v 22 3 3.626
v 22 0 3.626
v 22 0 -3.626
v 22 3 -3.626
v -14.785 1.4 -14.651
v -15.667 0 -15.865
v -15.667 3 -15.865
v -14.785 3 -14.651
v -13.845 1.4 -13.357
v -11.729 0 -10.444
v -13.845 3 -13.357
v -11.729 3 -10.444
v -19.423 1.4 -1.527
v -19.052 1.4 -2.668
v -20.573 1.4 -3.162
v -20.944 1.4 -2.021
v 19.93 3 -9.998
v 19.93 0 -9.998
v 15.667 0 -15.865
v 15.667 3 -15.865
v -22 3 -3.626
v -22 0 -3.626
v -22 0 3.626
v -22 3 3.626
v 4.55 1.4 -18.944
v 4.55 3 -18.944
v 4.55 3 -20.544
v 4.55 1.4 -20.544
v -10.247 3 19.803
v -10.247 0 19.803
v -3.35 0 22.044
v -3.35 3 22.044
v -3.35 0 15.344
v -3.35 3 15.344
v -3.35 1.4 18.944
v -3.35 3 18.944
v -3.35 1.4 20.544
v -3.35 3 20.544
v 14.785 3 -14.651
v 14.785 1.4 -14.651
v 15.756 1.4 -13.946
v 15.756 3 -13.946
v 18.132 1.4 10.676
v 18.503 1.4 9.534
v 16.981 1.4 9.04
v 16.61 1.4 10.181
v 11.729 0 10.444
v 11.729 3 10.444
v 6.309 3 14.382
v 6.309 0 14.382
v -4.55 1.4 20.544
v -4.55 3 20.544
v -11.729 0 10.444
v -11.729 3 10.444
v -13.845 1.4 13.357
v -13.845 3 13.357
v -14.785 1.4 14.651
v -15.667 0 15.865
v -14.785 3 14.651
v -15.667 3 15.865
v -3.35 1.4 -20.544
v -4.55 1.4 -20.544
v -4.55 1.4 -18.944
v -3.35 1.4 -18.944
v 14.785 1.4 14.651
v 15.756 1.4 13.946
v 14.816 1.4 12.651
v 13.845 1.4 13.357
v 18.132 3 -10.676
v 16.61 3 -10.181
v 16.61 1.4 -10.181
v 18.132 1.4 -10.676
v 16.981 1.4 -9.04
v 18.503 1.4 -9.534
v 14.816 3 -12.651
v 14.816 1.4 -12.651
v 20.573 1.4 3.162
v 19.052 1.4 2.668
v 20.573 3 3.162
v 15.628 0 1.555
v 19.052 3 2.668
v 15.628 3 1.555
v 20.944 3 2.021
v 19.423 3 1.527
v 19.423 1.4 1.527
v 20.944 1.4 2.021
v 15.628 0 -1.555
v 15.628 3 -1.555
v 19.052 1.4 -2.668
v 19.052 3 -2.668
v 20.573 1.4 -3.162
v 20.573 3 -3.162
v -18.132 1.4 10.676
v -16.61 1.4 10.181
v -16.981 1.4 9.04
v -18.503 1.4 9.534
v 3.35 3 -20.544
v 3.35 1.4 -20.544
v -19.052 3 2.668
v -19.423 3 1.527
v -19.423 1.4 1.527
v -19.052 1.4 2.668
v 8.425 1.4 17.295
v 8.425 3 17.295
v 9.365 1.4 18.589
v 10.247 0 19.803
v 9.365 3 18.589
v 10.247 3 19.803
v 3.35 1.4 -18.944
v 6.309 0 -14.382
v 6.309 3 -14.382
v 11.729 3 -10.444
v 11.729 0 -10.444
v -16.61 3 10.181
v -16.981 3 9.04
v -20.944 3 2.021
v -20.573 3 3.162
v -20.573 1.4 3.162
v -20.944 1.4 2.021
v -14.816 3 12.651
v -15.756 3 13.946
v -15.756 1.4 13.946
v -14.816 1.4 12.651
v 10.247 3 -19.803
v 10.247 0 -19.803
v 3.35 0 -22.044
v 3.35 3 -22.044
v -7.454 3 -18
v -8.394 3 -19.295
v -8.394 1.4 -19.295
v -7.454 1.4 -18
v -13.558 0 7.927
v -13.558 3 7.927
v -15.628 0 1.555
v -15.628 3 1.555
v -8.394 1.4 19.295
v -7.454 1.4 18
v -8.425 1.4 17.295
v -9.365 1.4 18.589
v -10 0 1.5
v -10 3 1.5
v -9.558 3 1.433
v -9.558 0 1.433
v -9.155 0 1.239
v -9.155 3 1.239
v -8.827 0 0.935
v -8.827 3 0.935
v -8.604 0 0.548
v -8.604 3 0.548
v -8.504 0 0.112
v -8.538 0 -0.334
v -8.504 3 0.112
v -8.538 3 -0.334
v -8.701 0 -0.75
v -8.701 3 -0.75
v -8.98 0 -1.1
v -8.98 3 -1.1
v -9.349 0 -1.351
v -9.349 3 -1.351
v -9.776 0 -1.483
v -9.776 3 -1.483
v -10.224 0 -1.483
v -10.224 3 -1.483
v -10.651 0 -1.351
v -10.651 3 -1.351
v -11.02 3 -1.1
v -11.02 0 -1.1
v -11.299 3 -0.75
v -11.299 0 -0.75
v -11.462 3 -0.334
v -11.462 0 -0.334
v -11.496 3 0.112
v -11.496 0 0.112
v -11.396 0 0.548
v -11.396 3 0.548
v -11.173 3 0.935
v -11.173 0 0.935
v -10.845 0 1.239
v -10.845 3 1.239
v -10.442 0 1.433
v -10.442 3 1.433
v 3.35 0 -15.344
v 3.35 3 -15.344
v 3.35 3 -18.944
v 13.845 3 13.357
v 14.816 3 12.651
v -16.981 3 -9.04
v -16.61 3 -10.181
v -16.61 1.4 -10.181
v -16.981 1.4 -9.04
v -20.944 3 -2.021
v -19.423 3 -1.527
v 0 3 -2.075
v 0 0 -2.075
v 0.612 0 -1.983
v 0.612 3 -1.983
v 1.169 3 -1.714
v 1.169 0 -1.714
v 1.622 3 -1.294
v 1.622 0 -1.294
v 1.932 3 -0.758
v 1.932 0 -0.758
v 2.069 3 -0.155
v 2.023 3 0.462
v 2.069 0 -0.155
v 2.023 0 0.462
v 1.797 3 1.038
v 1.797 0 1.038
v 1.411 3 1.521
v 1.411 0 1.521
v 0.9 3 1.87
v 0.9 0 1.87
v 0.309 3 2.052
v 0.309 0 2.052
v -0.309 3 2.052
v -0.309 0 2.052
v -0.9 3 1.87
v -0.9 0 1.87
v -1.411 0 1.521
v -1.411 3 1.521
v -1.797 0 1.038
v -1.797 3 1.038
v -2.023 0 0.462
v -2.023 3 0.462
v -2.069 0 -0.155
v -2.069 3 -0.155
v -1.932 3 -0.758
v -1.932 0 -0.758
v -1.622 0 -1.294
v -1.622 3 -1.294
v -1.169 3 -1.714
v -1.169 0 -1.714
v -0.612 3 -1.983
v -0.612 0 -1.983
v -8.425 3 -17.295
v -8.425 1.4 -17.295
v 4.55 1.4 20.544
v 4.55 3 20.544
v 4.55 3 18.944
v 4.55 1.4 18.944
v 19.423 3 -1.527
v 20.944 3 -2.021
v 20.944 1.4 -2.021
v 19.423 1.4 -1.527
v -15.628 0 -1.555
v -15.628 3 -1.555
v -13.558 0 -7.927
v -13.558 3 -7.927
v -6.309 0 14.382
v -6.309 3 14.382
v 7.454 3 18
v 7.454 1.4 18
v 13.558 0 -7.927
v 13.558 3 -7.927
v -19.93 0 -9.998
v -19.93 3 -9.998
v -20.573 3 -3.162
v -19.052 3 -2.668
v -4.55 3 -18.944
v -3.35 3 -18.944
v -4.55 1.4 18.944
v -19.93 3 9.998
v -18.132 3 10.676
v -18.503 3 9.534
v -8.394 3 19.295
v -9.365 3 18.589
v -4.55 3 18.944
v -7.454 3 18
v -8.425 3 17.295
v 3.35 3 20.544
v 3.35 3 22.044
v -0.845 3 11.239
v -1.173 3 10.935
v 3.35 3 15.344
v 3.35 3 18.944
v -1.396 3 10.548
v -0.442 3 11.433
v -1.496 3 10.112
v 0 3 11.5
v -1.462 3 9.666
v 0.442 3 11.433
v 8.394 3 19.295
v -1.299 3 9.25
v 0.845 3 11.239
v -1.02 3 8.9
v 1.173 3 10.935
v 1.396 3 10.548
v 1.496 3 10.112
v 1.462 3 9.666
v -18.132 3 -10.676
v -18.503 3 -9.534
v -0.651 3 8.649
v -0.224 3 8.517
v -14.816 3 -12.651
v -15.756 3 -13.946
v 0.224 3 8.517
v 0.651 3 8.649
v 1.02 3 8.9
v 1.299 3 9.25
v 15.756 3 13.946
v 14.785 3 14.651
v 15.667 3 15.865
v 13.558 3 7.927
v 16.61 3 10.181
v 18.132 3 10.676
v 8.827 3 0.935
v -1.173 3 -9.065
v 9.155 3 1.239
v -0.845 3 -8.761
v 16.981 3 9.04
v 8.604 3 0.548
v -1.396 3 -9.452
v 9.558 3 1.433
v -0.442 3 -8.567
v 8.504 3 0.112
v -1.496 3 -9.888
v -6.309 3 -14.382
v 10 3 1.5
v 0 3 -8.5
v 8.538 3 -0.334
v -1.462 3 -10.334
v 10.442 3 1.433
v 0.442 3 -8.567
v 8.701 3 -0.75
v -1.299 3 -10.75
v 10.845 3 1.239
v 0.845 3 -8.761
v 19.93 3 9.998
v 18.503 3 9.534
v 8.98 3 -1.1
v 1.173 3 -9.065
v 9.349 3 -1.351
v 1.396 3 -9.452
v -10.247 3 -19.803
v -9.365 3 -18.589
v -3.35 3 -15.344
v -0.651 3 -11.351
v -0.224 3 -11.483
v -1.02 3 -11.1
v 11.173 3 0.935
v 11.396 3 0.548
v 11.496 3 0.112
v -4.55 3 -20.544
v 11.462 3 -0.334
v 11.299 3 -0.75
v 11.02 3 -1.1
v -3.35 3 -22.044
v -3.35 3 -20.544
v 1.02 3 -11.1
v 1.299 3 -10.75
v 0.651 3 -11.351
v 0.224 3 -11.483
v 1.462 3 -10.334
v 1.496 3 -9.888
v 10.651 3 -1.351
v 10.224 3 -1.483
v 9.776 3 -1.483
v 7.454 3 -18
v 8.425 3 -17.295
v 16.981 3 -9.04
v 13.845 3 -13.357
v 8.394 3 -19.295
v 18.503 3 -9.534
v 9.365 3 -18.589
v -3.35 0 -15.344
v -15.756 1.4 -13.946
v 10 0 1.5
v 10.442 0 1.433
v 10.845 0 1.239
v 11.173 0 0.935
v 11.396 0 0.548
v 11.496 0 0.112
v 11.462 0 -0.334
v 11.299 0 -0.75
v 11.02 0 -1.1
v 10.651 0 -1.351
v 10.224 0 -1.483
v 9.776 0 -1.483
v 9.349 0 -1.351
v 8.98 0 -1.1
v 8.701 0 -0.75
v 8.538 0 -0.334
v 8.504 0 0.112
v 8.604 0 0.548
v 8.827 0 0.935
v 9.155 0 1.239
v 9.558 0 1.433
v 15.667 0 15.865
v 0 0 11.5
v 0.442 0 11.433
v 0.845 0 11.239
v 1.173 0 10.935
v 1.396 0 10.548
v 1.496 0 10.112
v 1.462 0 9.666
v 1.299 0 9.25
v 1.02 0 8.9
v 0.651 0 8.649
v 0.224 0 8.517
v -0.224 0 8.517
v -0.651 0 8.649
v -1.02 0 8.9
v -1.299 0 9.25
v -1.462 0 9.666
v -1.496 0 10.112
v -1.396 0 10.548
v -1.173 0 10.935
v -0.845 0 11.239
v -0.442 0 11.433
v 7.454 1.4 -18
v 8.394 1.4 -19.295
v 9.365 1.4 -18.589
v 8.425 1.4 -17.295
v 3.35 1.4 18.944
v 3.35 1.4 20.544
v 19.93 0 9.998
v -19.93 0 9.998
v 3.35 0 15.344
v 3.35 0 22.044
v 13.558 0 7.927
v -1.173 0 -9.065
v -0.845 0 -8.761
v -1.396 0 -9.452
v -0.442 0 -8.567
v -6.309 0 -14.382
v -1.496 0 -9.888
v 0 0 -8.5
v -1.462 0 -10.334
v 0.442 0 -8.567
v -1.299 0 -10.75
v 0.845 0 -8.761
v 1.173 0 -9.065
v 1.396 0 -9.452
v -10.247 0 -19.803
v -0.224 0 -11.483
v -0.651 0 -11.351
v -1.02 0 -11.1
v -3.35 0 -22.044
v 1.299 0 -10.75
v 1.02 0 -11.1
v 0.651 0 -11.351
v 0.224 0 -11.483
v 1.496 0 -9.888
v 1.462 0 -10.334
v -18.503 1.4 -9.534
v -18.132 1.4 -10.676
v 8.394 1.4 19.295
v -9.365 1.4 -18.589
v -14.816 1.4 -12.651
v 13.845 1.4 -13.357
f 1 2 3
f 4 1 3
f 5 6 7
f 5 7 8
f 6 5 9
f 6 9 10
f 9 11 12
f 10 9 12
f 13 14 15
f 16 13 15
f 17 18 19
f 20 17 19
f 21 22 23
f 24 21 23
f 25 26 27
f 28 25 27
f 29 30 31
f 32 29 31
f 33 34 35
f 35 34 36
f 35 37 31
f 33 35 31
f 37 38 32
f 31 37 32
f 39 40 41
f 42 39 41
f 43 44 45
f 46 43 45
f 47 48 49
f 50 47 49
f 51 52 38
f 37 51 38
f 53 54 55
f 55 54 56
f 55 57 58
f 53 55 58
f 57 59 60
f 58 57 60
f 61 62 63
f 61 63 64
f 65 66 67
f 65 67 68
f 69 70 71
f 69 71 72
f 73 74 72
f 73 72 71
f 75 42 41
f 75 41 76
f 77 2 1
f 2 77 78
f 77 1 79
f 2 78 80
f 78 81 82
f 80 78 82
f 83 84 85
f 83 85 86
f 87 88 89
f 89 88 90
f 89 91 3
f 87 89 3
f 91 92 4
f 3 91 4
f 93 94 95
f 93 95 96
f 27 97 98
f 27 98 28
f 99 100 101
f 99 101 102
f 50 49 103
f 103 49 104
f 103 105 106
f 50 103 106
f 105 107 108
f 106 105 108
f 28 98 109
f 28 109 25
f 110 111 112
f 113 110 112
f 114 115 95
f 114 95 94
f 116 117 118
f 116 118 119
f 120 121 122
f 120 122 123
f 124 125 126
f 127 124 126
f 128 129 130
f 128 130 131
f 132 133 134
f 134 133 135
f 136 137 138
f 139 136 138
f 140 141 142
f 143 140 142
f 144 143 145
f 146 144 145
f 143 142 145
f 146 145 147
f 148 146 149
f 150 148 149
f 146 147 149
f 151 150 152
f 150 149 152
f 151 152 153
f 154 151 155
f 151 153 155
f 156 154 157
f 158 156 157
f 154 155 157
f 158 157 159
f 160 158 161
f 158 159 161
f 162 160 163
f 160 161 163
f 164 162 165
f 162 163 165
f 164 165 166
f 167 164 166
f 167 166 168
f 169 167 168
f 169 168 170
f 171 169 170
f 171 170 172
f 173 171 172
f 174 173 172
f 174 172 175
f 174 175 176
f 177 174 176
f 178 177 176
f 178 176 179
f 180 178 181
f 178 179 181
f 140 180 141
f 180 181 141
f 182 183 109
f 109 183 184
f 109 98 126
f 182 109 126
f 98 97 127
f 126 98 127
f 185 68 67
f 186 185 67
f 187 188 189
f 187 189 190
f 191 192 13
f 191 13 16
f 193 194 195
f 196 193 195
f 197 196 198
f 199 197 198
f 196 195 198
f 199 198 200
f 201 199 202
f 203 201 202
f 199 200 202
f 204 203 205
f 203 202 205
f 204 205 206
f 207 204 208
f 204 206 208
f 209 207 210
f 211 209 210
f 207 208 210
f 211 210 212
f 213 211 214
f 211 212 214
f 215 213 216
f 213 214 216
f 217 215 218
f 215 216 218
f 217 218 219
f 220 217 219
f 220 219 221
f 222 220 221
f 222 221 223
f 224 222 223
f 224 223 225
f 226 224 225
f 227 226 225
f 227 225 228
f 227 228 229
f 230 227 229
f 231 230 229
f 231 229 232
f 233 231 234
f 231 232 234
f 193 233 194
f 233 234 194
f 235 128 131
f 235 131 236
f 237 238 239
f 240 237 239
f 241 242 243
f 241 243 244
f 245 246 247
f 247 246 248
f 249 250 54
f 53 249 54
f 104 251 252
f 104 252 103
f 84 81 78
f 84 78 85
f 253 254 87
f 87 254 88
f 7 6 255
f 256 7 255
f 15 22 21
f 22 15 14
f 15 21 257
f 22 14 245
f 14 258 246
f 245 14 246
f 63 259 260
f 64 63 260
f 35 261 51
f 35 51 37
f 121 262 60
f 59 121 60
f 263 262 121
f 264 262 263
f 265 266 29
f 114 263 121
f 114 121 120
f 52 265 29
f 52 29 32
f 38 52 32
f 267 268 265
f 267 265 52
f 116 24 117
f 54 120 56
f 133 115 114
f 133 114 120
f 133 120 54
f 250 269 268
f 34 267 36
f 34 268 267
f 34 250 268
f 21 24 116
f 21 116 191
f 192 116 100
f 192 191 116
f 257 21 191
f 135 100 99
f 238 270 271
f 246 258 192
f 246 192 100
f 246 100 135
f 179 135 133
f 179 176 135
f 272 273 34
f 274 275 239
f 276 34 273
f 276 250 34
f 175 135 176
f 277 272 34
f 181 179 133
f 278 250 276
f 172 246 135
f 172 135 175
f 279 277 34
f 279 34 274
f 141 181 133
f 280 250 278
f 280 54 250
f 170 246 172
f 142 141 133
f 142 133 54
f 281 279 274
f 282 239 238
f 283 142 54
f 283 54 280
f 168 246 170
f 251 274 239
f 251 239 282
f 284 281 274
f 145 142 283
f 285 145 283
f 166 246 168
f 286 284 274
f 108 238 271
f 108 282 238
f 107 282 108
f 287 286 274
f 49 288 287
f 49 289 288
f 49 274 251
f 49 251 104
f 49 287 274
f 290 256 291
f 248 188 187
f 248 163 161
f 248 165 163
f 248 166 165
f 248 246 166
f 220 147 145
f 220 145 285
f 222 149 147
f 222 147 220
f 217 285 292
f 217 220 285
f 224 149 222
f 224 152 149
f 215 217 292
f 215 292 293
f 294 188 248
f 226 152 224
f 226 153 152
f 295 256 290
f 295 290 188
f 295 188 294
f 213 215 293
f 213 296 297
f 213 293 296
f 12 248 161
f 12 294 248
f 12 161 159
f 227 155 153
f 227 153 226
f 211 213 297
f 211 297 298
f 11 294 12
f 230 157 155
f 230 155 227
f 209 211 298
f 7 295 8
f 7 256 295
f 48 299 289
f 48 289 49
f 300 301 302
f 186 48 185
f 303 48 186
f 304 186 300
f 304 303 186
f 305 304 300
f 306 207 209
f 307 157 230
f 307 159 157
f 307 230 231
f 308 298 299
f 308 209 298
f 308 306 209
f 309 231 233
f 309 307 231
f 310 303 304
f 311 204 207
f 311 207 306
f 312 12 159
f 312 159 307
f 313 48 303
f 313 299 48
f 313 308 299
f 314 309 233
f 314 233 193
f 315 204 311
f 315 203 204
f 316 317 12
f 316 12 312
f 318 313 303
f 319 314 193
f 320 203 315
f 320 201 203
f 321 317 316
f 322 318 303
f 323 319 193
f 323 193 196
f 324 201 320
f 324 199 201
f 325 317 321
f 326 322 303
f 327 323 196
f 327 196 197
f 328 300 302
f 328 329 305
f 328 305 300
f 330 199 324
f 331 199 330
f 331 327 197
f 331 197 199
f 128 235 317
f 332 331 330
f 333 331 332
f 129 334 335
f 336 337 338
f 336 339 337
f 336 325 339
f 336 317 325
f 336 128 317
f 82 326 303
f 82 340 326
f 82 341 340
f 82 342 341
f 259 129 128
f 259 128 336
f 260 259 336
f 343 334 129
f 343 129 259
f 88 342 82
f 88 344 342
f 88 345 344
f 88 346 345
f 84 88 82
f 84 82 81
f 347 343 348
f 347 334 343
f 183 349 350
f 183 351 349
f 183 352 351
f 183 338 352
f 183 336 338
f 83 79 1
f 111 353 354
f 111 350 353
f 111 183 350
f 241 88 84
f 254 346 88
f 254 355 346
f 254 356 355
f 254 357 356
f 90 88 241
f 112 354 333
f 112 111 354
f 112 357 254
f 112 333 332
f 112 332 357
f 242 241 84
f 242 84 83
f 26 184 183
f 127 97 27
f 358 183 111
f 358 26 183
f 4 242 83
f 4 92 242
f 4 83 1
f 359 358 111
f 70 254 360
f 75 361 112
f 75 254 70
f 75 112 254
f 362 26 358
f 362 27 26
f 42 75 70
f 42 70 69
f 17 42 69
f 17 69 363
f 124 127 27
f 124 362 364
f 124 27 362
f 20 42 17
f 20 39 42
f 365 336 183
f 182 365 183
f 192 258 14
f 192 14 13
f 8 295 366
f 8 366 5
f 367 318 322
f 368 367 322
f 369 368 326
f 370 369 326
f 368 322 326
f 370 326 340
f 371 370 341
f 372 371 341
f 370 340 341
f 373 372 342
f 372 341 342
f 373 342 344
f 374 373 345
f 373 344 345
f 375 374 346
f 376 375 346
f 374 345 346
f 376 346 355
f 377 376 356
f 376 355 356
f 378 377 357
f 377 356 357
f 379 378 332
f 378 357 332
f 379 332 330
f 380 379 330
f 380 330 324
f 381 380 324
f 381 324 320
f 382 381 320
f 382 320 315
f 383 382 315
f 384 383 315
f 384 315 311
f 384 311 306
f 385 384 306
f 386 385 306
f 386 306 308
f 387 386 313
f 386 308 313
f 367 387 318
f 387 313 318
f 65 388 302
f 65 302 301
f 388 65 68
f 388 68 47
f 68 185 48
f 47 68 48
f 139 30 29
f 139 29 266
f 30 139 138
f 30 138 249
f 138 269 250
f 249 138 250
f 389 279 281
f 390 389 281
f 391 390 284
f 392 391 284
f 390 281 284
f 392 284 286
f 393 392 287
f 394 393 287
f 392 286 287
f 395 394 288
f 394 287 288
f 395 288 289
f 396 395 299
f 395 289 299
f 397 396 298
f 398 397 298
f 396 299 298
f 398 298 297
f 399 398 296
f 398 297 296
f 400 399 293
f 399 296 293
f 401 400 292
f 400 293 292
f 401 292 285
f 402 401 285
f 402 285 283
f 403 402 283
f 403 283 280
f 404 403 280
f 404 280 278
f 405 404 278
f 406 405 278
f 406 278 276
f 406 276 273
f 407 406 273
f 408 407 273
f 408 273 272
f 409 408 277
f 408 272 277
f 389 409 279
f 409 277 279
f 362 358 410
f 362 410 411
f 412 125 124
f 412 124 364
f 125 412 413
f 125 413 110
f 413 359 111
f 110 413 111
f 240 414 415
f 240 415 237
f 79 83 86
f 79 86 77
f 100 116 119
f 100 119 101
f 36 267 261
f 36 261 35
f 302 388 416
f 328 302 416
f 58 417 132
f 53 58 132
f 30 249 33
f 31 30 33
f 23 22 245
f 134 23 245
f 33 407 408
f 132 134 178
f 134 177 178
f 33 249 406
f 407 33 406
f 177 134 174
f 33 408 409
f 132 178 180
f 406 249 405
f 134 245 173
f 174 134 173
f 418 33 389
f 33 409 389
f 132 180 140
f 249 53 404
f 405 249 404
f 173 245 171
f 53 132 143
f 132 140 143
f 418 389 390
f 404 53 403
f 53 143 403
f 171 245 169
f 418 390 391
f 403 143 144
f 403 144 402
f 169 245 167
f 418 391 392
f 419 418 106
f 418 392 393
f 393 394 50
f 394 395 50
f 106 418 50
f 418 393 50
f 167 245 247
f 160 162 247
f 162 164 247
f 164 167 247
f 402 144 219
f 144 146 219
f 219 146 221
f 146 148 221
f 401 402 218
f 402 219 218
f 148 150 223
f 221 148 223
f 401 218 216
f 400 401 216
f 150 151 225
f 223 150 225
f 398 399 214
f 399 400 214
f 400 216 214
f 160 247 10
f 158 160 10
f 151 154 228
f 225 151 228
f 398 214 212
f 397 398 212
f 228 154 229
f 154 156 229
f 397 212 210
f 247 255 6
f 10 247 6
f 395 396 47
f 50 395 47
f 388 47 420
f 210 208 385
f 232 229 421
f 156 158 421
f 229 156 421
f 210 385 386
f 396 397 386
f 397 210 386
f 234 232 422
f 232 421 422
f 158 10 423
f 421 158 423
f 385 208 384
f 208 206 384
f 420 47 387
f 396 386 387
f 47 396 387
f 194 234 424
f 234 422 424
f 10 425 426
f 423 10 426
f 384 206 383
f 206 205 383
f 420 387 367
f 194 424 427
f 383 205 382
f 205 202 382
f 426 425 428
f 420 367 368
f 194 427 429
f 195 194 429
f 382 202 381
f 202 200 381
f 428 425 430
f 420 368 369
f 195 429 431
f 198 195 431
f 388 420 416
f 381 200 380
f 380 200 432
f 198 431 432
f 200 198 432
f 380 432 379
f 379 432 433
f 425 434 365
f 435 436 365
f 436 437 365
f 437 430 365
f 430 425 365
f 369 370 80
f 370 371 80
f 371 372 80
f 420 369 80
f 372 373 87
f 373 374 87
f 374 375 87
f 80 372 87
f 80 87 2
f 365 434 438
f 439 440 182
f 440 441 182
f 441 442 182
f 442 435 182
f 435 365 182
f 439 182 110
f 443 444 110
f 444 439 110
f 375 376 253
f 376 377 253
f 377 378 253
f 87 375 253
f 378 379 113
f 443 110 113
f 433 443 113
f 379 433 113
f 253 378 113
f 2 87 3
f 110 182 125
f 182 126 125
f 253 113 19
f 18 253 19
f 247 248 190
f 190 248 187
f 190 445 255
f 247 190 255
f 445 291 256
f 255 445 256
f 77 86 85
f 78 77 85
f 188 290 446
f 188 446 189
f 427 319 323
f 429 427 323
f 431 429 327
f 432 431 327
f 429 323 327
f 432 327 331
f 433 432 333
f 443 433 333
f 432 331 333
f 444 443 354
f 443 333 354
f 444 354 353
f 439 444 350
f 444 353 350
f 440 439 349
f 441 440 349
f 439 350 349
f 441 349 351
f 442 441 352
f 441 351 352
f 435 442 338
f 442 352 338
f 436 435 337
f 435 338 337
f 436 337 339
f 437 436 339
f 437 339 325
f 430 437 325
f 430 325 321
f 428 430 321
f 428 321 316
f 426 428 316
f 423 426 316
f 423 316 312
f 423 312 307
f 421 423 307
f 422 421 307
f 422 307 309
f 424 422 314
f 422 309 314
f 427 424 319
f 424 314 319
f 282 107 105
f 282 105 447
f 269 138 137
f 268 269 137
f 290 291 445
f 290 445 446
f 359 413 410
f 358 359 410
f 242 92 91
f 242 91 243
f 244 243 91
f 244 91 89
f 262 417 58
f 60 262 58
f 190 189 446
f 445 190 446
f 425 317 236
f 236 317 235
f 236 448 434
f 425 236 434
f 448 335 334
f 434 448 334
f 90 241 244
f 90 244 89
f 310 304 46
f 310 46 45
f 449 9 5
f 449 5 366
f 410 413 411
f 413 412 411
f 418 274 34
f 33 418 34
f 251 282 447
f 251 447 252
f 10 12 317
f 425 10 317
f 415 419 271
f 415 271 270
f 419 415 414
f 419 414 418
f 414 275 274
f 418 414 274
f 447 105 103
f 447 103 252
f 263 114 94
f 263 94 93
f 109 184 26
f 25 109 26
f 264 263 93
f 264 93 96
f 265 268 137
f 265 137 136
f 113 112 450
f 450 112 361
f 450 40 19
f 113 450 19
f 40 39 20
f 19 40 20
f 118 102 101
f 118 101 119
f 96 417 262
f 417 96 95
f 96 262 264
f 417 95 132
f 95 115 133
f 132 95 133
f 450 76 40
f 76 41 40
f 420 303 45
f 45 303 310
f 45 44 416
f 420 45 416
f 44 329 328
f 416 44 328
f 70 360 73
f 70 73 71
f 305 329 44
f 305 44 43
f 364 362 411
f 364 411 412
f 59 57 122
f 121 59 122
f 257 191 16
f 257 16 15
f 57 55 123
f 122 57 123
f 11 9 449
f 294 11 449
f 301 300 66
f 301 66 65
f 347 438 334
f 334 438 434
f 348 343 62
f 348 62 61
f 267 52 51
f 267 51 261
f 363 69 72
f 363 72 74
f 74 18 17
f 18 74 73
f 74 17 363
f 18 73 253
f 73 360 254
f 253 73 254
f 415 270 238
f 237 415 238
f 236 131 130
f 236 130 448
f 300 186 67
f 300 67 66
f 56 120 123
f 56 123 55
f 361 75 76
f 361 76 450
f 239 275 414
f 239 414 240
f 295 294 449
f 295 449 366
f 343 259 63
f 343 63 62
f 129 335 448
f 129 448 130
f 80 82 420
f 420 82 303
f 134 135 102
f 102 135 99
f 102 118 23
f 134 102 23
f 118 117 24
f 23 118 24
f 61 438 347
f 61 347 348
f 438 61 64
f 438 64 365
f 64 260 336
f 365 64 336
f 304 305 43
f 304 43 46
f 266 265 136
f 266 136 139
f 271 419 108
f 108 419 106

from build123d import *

# Parameters (mm, degrees)
BOSS_EXTRUDE1_DEPTH = 3
CUT_EXTRUDE1_DEPTH  = 3
SKETCH7_R           = 1.5
CUT_EXTRUDE3_DEPTH  = 3
SKETCH4_W           = 9.1
SKETCH4_H           = 1.6
CUT_EXTRUDE2_DEPTH  = 1.6
SKETCH10_R          = 2.075
CUT_EXTRUDE6_DEPTH  = 3


with BuildPart() as part:
    # Sketch1 → Boss-Extrude1 (new body)
    with BuildSketch(Plane(origin=(0, 0, 0), x_dir=(1, 0, 0), z_dir=(0, 1, 0))):
        Polygon((0, 23.132168933), (-13.596747752, 18.714317784), (-22, 7.148233317), (-22, -7.148233317), (-13.596747752, -18.714317784), (0, -23.132168933), (13.596747752, -18.714317784), (22, -7.148233317), (22, 7.148233317), (13.596747752, 18.714317784), align=None)
    extrude(amount=BOSS_EXTRUDE1_DEPTH)

    # Sketch2 → Cut-Extrude1 (cut)
    with BuildSketch(Plane(origin=(0, 3, 0), x_dir=(1, 0, 0), z_dir=(0, 1, 0))):
        Polygon((0, 23.132168933), (-3.35, 22.043687951), (-3.35, 15.343687951), (3.35, 15.343687951), (3.35, 22.043687951), align=None)
        Polygon((11.729000424, 10.444223713), (15.667161615, 15.864637576), (13.596747752, 18.714317784), (10.246747752, 19.802798766), (6.308586562, 14.382384904), align=None)
        Polygon((15.627921341, 1.555421004), (22, 3.625834866), (22, 7.148233317), (19.929586138, 9.997913525), (13.557507479, 7.927499663), align=None)
        Polygon((13.557507479, -7.927499663), (19.929586138, -9.997913525), (22, -7.148233317), (22, -3.625834866), (15.627921341, -1.555421004), align=None)
        Polygon((6.308586562, -14.382384904), (10.246747752, -19.802798766), (13.596747752, -18.714317784), (15.667161615, -15.864637576), (11.729000424, -10.444223713), align=None)
        Polygon((-3.35, -15.343687951), (-3.35, -22.043687951), (0, -23.132168933), (3.35, -22.043687951), (3.35, -15.343687951), align=None)
        Polygon((-11.729000424, -10.444223713), (-15.667161615, -15.864637576), (-13.596747752, -18.714317784), (-10.246747752, -19.802798766), (-6.308586562, -14.382384904), align=None)
        Polygon((-15.627921341, -1.555421004), (-22, -3.625834866), (-22, -7.148233317), (-19.929586138, -9.997913525), (-13.557507479, -7.927499663), align=None)
        Polygon((-13.557507479, 7.927499663), (-19.929586138, 9.997913525), (-22, 7.148233317), (-22, 3.625834866), (-15.627921341, 1.555421004), align=None)
        Polygon((-6.308586562, 14.382384904), (-10.246747752, 19.802798766), (-13.596747752, 18.714317784), (-15.667161615, 15.864637576), (-11.729000424, 10.444223713), align=None)
    extrude(amount=-CUT_EXTRUDE1_DEPTH, mode=Mode.SUBTRACT)

    # Sketch7 → Cut-Extrude3 (cut)
    with BuildSketch(Plane(origin=(0, 3, 0), x_dir=(1, 0, 0), z_dir=(0, 1, 0))):
        with Locations(Location((0, 10, 0), (0, 0, 270))):
            Circle(SKETCH7_R)
        with Locations(Location((10, 0, 0), (0, 0, 270))):
            Circle(SKETCH7_R)
        with Locations(Location((0, -10, 0), (0, 0, 270))):
            Circle(SKETCH7_R)
        with Locations(Location((-10, 0, 0), (0, 0, 270))):
            Circle(SKETCH7_R)
    extrude(amount=-CUT_EXTRUDE3_DEPTH, mode=Mode.SUBTRACT)

    # Sketch4 → Cut-Extrude2 (cut)
    with BuildSketch(Plane(origin=(0, 3, 0), x_dir=(1, 0, 0), z_dir=(0, 1, 0))):
        with Locations((0, 19.743687951)):
            Rectangle(SKETCH4_W, SKETCH4_H)
        Polygon((7.453793077, 18.000188386), (8.394249481, 19.294615577), (15.75630413, 13.945769781), (14.815847726, 12.65134259), align=None)
        Polygon((16.610490544, 10.181228662), (18.13218097, 10.675655853), (20.944235619, 2.021041555), (19.422545193, 1.526614364), align=None)
        Polygon((19.422545193, -1.526614364), (20.944235619, -2.021041555), (18.13218097, -10.675655853), (16.610490544, -10.181228662), align=None)
        Polygon((14.815847726, -12.65134259), (15.75630413, -13.945769781), (8.394249481, -19.294615577), (7.453793077, -18.000188386), align=None)
        with Locations((0, -19.743687951)):
            Rectangle(SKETCH4_W, SKETCH4_H)
        Polygon((-7.453793077, -18.000188386), (-8.394249481, -19.294615577), (-15.75630413, -13.945769781), (-14.815847726, -12.65134259), align=None)
        Polygon((-16.610490544, -10.181228662), (-18.13218097, -10.675655853), (-20.944235619, -2.021041555), (-19.422545193, -1.526614364), align=None)
        Polygon((-19.422545193, 1.526614364), (-20.944235619, 2.021041555), (-18.13218097, 10.675655853), (-16.610490544, 10.181228662), align=None)
        Polygon((-14.815847726, 12.65134259), (-15.75630413, 13.945769781), (-8.394249481, 19.294615577), (-7.453793077, 18.000188386), align=None)
    extrude(amount=-CUT_EXTRUDE2_DEPTH, mode=Mode.SUBTRACT)

    # Sketch10 → Cut-Extrude6 (cut)
    with BuildSketch(Plane.XZ):
        with Locations(Location((0, 0, 0), (0, 0, 270))):
            Circle(SKETCH10_R)
    extrude(amount=-CUT_EXTRUDE6_DEPTH, mode=Mode.SUBTRACT)


solid = part.part
